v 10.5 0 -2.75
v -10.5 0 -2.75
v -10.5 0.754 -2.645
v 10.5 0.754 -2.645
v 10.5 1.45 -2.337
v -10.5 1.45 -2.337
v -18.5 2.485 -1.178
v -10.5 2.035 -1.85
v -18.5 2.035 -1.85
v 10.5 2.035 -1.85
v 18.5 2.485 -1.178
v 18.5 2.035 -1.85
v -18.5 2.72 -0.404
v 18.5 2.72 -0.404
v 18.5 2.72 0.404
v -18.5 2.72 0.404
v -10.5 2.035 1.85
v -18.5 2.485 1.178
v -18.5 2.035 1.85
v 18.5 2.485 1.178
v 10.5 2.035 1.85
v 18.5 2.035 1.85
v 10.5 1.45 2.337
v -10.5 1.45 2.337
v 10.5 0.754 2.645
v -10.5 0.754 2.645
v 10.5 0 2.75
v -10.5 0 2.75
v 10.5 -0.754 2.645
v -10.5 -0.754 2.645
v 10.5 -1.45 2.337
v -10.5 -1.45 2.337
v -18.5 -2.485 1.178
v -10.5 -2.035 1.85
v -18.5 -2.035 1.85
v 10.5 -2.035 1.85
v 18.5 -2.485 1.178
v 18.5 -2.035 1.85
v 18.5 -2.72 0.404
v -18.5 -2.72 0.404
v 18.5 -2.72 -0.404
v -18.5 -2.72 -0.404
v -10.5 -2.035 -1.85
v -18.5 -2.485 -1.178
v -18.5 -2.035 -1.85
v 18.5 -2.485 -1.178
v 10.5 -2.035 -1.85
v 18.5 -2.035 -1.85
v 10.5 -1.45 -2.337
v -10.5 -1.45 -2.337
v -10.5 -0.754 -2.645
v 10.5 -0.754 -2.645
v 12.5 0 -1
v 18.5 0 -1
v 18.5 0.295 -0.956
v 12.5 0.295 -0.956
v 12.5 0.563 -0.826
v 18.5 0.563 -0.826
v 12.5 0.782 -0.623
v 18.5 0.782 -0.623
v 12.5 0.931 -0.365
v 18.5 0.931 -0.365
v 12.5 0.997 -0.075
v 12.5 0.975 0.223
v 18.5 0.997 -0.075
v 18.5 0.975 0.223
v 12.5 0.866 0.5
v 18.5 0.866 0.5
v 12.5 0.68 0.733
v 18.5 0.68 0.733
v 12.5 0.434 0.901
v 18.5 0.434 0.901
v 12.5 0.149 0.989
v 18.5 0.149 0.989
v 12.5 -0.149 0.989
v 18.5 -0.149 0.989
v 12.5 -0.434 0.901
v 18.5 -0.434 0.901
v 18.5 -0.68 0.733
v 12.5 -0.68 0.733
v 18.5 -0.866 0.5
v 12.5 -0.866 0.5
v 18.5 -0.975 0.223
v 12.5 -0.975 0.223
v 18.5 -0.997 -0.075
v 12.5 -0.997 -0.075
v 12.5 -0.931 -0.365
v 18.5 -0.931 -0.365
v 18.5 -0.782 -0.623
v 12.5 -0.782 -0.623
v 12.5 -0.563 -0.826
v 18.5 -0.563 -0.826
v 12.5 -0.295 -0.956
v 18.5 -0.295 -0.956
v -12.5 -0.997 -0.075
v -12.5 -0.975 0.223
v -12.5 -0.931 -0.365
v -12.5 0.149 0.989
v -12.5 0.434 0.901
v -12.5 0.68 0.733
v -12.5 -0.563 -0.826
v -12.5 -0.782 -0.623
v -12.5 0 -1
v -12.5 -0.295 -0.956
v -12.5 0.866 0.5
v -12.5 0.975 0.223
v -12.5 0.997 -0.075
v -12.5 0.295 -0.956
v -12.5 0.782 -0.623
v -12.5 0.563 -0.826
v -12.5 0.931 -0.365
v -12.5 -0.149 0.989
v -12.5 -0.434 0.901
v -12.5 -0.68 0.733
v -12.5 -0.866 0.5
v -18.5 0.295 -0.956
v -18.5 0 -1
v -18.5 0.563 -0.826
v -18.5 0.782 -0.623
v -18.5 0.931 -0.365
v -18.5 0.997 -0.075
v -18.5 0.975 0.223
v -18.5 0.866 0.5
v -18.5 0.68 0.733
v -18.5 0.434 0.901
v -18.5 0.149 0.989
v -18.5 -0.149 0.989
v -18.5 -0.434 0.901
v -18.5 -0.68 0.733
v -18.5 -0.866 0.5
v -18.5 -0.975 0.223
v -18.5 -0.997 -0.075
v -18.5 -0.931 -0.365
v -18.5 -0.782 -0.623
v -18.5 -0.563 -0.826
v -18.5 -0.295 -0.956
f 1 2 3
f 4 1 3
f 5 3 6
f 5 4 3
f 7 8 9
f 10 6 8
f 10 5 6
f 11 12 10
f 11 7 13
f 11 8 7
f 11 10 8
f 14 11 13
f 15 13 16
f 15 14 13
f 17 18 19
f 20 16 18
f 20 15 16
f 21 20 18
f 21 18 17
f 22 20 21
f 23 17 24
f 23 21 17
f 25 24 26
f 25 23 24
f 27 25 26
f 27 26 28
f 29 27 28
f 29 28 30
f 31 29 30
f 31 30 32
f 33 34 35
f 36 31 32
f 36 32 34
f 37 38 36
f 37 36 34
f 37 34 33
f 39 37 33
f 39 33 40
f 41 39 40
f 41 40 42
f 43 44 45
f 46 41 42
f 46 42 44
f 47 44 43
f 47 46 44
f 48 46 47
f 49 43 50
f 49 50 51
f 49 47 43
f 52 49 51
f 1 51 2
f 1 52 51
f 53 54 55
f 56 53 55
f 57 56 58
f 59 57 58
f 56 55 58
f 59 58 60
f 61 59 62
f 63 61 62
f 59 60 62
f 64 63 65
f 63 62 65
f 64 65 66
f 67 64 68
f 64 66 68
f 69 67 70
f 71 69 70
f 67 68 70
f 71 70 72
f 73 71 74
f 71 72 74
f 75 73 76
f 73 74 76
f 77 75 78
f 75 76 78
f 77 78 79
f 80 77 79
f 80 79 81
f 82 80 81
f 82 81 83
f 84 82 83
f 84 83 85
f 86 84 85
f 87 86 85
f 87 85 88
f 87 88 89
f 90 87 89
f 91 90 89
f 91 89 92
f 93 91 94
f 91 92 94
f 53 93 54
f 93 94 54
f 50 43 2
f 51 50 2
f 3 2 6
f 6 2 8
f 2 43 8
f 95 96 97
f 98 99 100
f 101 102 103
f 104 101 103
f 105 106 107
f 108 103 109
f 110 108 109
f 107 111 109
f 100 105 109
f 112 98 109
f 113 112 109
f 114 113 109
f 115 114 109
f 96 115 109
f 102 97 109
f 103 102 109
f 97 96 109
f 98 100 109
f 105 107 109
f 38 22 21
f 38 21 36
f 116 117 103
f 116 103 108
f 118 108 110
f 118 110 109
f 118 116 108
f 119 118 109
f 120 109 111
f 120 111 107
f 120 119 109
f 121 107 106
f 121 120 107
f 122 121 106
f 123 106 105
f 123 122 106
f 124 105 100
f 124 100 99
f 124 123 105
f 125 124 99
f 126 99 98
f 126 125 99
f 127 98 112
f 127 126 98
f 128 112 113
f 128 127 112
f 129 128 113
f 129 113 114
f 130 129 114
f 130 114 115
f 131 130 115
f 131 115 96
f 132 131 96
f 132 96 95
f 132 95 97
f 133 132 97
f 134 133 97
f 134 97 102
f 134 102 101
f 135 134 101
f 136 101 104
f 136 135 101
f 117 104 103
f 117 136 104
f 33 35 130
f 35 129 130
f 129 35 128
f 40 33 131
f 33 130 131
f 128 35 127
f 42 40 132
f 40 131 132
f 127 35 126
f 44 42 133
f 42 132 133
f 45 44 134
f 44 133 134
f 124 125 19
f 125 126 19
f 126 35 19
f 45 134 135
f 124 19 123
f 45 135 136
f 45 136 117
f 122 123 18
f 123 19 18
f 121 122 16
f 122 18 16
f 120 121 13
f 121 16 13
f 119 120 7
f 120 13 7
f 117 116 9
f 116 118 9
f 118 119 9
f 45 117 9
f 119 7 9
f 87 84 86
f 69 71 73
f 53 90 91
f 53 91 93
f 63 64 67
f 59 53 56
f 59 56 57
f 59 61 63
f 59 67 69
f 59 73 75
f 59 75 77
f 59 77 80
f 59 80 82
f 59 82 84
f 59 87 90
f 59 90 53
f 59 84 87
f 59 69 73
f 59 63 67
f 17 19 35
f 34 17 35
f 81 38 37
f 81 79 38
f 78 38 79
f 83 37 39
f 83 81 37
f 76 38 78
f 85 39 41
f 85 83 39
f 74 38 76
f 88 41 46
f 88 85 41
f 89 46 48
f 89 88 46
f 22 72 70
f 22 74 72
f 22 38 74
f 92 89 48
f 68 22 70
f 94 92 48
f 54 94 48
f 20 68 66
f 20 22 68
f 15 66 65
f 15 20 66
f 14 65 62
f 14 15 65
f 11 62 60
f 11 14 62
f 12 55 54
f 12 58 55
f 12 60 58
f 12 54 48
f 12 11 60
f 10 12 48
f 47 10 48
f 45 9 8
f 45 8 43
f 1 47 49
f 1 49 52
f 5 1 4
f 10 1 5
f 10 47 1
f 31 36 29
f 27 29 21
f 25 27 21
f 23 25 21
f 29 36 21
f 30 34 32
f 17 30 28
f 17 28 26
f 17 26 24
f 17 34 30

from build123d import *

# Parameters (mm, degrees)
SKETCH1_R           = 2.75
BOSS_EXTRUDE1_DEPTH = 18.5
CUT_EXTRUDE1_DEPTH  = 8
SKETCH3_R           = 1
CUT_EXTRUDE2_DEPTH  = 6


with BuildPart() as part:
    # Sketch1 → Boss-Extrude1 (new, symmetric)
    with BuildSketch(Plane(origin=(0, 0, 0), x_dir=(0, 0, -1), z_dir=(1, 0, 0))):
        Circle(SKETCH1_R)
    extrude(amount=BOSS_EXTRUDE1_DEPTH, both=True)

    # Sketch2 → Cut-Extrude1 (cut)
    with BuildSketch(Plane(origin=(18.5, 0, 0), x_dir=(0, 0, -1), z_dir=(1, 0, 0))):
        with BuildLine():
            Line((-1.85, 2.034698995), (-1.85, -2.034698995))
            ThreePointArc((-1.85, -2.034698995), (-2.75, 0), (-1.85, 2.034698995))
        make_face()
        with BuildLine():
            Line((1.85, 2.034698995), (1.85, -2.034698995))
            ThreePointArc((1.85, -2.034698995), (2.75, 0), (1.85, 2.034698995))
        make_face()
    cut_extrude1 = extrude(amount=-CUT_EXTRUDE1_DEPTH, mode=Mode.SUBTRACT)

    # Sketch3 → Cut-Extrude2 (cut)
    with BuildSketch(Plane(origin=(18.5, 0, 0), x_dir=(0, 0, -1), z_dir=(1, 0, 0))):
        Circle(SKETCH3_R)
    cut_extrude2 = extrude(amount=-CUT_EXTRUDE2_DEPTH, mode=Mode.SUBTRACT)

    # Mirror1: Cut-Extrude1, Cut-Extrude2 across plane
    add(cut_extrude1.mirror(Plane(origin=(0, 0, 0), x_dir=(0, 0, 1), z_dir=(1, 0, 0))), mode=Mode.SUBTRACT)
    add(cut_extrude2.mirror(Plane(origin=(0, 0, 0), x_dir=(0, 0, 1), z_dir=(1, 0, 0))), mode=Mode.SUBTRACT)


solid = part.part
